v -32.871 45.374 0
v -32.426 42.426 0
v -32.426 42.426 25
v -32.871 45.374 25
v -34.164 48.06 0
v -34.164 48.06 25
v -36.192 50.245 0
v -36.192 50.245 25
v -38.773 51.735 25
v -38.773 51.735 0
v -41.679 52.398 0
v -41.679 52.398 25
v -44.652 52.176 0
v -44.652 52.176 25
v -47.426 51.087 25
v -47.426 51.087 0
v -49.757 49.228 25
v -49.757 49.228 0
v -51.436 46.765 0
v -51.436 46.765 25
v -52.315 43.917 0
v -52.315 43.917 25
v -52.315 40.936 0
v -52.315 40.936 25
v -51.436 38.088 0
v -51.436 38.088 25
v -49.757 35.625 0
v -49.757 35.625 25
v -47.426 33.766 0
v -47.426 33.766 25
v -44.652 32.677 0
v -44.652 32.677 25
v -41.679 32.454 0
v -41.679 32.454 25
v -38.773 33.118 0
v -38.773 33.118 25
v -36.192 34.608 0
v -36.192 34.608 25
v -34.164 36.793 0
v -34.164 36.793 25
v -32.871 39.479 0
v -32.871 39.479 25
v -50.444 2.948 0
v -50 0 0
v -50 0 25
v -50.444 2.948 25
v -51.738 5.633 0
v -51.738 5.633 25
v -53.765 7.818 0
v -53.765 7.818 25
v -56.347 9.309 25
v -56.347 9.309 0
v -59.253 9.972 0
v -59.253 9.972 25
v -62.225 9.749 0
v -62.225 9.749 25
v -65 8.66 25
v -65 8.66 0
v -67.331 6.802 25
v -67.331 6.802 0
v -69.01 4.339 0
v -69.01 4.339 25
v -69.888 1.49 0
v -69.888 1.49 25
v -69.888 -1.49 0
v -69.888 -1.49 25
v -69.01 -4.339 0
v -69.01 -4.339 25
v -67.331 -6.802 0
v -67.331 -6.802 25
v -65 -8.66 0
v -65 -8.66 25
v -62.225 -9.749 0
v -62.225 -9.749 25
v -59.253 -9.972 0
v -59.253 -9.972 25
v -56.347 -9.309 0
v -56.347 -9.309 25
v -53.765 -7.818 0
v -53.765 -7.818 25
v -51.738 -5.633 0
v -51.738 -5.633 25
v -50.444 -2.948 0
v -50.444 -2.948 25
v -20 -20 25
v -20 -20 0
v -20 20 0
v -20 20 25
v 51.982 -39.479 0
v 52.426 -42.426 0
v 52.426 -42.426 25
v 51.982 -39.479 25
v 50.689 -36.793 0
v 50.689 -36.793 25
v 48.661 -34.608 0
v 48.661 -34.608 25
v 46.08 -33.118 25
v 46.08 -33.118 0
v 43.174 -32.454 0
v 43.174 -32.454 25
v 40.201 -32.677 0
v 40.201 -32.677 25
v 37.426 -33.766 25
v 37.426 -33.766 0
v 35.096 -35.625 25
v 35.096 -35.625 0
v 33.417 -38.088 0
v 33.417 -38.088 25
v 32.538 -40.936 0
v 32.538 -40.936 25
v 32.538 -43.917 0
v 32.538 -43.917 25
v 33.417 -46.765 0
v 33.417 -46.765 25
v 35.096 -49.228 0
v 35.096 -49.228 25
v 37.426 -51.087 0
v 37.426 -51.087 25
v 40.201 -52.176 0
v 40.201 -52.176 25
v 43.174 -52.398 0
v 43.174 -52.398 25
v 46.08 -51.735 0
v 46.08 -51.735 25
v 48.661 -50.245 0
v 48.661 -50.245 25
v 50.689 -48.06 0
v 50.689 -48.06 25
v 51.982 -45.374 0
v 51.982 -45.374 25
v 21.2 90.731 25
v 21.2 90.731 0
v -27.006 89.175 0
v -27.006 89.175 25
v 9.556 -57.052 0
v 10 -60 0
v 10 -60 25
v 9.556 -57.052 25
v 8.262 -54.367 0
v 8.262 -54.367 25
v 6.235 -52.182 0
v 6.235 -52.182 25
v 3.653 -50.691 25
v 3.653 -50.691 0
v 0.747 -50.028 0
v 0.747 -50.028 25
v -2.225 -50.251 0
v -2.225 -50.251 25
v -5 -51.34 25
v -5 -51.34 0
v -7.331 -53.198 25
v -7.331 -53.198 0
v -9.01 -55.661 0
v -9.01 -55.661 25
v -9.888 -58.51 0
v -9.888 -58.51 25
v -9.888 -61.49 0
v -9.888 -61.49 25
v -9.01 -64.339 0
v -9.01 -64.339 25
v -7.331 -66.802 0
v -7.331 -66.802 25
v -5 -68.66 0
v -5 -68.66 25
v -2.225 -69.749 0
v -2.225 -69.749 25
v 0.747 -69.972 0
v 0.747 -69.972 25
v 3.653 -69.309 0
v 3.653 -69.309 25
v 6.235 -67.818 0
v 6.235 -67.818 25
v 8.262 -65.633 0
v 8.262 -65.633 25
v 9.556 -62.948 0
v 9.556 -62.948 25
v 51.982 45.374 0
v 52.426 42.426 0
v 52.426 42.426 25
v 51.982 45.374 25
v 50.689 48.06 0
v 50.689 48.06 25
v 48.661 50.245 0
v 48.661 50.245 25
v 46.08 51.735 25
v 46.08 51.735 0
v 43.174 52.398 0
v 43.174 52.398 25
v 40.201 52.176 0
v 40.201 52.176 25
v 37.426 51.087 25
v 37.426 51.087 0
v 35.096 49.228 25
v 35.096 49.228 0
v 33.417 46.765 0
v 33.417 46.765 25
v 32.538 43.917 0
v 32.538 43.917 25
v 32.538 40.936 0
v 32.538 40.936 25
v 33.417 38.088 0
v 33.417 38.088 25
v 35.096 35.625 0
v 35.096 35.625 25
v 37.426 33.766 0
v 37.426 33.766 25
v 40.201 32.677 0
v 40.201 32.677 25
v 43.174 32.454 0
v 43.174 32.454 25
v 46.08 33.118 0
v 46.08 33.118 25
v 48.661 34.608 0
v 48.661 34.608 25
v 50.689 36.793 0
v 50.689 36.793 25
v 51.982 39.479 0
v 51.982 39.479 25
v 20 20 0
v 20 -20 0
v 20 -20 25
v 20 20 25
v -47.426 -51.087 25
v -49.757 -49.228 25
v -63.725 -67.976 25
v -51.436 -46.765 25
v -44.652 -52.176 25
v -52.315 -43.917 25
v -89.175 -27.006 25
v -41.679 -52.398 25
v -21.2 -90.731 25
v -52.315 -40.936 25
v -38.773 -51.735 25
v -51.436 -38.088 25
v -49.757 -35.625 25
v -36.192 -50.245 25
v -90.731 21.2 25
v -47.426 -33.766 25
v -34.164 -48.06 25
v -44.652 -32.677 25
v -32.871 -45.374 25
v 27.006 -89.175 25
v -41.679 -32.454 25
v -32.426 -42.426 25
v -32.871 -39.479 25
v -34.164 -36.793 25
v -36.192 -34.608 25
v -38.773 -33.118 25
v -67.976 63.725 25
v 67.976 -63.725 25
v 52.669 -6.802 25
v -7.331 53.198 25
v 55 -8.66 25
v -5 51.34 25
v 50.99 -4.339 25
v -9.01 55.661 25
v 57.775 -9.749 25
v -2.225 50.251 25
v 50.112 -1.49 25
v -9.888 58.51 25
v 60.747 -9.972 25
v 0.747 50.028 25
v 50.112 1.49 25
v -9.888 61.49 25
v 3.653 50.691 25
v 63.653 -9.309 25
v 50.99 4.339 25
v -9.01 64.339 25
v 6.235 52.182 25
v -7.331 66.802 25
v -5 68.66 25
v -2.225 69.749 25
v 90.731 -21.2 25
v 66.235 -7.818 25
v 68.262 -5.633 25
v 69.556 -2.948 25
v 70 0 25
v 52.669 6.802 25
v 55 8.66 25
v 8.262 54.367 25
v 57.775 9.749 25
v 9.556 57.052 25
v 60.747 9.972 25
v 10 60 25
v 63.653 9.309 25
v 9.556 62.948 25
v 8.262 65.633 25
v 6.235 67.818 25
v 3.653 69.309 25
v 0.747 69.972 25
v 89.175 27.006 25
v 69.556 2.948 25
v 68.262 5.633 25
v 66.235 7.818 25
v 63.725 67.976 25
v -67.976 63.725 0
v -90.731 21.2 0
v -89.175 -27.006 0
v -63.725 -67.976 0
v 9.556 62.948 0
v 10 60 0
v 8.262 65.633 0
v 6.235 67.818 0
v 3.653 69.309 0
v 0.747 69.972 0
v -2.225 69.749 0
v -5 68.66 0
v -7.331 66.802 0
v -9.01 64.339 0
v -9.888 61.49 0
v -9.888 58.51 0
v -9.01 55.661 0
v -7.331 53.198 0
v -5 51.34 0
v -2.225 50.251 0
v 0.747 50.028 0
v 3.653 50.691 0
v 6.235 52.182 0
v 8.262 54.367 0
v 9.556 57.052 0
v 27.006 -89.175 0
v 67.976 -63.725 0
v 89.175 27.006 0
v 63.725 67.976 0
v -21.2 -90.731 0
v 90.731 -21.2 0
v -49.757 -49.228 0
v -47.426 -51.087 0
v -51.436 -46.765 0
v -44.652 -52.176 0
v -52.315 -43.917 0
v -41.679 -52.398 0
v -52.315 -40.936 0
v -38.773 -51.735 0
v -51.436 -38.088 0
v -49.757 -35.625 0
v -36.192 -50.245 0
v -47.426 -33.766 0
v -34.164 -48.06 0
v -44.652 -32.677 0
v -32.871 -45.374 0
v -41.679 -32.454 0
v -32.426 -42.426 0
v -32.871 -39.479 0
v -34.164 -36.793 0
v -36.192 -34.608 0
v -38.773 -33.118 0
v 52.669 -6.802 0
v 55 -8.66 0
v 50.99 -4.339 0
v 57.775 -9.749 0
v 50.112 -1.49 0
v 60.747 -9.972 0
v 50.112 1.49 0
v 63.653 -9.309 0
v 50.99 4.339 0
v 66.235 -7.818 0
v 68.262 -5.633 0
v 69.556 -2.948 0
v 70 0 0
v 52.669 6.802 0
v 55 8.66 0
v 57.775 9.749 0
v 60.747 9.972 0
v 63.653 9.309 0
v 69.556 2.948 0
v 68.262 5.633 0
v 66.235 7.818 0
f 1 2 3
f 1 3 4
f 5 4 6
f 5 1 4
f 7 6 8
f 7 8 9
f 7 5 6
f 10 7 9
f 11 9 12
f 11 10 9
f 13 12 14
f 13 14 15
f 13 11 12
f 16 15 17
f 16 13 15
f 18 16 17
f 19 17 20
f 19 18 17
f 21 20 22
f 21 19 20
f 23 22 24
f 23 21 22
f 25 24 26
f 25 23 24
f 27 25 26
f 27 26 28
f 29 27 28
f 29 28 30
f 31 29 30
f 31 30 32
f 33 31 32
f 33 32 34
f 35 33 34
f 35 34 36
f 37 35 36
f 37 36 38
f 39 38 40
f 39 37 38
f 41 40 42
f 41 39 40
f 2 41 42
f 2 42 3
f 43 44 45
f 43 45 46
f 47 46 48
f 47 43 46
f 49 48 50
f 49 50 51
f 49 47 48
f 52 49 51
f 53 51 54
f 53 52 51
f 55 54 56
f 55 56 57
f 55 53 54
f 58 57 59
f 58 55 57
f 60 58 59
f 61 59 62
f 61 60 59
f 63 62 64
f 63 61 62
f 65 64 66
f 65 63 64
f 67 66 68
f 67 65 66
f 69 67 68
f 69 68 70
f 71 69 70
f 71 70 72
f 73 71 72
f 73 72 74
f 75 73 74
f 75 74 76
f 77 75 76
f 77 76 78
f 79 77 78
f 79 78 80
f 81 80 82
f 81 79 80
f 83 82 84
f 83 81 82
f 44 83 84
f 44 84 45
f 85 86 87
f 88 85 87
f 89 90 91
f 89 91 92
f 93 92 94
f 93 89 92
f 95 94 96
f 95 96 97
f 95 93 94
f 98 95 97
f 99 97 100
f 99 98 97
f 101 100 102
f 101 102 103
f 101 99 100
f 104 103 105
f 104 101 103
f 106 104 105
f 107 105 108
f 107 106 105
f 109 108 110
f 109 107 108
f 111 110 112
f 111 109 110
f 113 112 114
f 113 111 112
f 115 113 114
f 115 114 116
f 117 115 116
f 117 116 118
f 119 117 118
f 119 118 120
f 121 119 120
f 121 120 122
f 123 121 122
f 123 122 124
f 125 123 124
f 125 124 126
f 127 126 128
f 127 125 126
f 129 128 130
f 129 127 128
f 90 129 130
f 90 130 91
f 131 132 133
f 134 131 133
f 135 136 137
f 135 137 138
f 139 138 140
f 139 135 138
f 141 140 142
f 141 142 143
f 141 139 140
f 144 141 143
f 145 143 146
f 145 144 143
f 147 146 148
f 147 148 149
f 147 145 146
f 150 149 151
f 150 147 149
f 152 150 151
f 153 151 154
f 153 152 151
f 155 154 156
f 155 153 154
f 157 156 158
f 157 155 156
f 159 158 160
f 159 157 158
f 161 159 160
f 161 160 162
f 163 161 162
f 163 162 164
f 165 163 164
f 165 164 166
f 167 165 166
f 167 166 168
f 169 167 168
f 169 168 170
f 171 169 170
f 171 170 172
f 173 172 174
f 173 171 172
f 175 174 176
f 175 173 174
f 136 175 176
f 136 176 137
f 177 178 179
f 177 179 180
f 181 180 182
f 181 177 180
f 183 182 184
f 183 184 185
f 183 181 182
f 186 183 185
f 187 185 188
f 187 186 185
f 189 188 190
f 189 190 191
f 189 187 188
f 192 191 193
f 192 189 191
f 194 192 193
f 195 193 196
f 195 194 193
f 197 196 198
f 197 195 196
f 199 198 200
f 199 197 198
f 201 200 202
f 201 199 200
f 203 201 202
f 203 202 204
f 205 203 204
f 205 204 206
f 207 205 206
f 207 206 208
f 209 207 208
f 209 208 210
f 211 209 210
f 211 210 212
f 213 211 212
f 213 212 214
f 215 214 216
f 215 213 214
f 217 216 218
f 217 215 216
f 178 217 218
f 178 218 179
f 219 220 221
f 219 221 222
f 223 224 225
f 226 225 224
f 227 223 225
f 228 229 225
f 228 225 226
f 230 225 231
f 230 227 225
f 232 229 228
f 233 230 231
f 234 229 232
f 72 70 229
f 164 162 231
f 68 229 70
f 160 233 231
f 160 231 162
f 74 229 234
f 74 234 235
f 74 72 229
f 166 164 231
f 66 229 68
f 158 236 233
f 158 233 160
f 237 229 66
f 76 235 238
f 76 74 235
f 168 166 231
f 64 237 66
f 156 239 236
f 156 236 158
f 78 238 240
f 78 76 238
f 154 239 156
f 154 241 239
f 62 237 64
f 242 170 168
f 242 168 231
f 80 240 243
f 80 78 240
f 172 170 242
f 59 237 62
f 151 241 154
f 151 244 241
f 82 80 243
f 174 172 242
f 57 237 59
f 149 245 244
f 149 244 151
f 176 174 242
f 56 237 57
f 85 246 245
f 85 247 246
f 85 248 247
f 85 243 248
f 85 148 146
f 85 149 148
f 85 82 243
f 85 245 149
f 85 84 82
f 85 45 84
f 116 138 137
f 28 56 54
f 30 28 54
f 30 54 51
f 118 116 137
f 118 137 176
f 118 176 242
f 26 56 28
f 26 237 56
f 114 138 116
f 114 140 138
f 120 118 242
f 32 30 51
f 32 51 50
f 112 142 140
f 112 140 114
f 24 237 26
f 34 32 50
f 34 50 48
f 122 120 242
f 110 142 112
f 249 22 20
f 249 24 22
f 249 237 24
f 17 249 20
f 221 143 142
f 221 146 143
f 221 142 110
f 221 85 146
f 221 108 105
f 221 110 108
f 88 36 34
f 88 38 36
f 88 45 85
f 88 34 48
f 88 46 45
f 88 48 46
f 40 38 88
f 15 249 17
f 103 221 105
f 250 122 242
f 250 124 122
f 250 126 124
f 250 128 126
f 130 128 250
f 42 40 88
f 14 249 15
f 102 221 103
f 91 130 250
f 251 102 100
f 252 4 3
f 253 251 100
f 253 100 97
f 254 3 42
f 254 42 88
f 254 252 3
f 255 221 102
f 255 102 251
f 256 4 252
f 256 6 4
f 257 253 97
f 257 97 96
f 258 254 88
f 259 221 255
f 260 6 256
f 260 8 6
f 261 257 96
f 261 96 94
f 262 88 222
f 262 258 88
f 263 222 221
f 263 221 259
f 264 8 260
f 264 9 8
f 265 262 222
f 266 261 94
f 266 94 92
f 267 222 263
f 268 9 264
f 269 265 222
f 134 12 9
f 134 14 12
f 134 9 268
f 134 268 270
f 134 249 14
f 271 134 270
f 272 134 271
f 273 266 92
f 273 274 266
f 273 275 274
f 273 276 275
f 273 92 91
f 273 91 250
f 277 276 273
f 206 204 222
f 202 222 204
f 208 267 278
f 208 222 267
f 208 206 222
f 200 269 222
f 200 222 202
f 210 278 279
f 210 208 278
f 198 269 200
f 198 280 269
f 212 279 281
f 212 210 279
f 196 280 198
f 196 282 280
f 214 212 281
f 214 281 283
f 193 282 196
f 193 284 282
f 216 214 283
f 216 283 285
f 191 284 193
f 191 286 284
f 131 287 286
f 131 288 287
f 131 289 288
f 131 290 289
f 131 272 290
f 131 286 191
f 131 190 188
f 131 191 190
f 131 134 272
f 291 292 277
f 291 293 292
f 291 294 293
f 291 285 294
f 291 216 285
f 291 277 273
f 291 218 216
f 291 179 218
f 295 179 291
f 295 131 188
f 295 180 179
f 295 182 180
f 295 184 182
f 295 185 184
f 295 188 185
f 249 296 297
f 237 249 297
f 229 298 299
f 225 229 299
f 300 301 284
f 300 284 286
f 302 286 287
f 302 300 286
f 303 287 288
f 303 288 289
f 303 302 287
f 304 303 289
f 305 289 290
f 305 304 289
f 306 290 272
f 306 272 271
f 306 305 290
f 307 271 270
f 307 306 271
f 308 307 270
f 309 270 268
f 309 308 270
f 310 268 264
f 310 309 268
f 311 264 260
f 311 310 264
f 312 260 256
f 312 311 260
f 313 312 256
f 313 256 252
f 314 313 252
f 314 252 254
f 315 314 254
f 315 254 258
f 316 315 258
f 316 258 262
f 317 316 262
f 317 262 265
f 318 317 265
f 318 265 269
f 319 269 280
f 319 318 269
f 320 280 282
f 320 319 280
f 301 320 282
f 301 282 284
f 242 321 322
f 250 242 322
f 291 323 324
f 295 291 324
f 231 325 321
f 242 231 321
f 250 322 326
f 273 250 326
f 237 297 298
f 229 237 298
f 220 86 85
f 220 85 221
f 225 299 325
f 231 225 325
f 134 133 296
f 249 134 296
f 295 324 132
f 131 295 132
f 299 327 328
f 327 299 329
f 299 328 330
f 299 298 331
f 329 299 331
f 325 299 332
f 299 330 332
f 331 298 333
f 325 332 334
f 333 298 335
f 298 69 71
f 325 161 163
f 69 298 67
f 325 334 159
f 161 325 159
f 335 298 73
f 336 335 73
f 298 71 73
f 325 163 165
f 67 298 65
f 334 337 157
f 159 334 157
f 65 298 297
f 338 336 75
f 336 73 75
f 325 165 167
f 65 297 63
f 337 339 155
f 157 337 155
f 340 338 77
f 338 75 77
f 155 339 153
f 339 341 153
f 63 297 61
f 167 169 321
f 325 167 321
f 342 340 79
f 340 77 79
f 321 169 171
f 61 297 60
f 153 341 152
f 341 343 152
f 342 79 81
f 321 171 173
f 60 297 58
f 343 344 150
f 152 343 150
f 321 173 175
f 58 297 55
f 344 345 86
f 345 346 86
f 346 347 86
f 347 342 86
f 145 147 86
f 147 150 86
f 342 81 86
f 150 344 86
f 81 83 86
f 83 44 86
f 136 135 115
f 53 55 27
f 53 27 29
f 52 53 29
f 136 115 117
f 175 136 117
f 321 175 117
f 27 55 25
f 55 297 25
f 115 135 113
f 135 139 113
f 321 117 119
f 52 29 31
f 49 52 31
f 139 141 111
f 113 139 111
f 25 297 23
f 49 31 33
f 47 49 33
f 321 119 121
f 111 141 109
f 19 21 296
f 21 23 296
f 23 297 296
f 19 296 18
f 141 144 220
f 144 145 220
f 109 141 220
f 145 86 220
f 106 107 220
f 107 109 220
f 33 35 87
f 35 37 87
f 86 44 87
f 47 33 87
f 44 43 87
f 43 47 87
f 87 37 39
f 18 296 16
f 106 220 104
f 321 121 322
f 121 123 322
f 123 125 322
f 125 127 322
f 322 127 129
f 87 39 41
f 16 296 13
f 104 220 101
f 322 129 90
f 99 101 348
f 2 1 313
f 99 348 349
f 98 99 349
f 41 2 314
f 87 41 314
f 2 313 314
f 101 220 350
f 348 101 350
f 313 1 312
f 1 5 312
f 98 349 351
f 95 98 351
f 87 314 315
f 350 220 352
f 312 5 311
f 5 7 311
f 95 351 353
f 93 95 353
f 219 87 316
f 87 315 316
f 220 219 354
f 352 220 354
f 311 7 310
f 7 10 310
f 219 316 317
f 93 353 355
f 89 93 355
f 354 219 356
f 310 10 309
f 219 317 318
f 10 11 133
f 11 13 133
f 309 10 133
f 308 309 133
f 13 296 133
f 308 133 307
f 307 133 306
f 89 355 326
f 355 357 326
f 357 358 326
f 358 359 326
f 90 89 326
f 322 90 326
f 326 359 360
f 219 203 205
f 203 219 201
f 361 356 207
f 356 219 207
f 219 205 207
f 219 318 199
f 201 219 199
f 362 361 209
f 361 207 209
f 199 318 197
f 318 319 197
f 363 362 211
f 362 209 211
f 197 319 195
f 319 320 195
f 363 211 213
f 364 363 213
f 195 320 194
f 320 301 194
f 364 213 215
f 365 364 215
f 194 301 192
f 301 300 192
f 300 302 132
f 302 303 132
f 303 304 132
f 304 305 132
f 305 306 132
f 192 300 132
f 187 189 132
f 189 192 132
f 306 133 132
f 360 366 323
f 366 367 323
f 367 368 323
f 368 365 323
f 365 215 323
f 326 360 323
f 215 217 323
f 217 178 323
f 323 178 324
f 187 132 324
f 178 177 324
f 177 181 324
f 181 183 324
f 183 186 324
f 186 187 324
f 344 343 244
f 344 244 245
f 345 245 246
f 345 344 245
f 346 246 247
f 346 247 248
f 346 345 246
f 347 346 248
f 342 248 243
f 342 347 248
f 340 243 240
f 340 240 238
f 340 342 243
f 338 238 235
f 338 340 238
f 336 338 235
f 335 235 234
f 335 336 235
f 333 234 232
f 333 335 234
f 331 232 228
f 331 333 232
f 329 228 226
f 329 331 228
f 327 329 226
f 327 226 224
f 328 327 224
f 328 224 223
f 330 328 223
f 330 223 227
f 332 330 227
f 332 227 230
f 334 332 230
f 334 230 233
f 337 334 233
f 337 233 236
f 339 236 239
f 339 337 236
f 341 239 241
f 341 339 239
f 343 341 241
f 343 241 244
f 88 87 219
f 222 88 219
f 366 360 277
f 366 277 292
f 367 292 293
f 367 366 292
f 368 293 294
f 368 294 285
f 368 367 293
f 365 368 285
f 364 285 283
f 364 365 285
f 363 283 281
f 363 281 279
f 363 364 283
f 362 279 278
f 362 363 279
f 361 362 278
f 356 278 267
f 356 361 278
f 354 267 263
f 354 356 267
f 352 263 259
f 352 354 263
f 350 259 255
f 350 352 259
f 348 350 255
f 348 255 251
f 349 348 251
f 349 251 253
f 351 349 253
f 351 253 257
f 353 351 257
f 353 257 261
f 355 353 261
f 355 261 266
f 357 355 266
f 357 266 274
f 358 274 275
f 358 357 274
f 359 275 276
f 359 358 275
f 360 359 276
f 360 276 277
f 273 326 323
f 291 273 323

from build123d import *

# Parameters (mm, degrees)
SKETCH3_R           = 10
SKETCH3_W           = 40
SKETCH3_H           = 40
BOSS_EXTRUDE1_DEPTH = 25


with BuildPart() as part:
    # Sketch3 → Boss-Extrude1 (new body)
    with BuildSketch(Plane.XY):
        Polygon((21.199617339, 90.731086511), (-27.006136089, 89.175234501), (-67.975617162, 63.724950422), (-90.731086511, 21.199617339), (-89.175234501, -27.006136089), (-63.724950422, -67.975617162), (-21.199617339, -90.731086511), (27.006136089, -89.175234501), (67.975617162, -63.724950422), (90.731086511, -21.199617339), (89.175234501, 27.006136089), (63.724950422, 67.975617162), align=None)
        with Locations((0, 60)):
            Circle(SKETCH3_R, mode=Mode.SUBTRACT)
        with Locations((42.426406871, 42.426406871)):
            Circle(SKETCH3_R, mode=Mode.SUBTRACT)
        with Locations((60, 0)):
            Circle(SKETCH3_R, mode=Mode.SUBTRACT)
        with Locations((42.426406871, -42.426406871)):
            Circle(SKETCH3_R, mode=Mode.SUBTRACT)
        with Locations((0, -60)):
            Circle(SKETCH3_R, mode=Mode.SUBTRACT)
        with Locations((-42.426406871, -42.426406871)):
            Circle(SKETCH3_R, mode=Mode.SUBTRACT)
        with Locations((-60, 0)):
            Circle(SKETCH3_R, mode=Mode.SUBTRACT)
        with Locations((-42.426406871, 42.426406871)):
            Circle(SKETCH3_R, mode=Mode.SUBTRACT)
        Rectangle(SKETCH3_W, SKETCH3_H, mode=Mode.SUBTRACT)
    extrude(amount=BOSS_EXTRUDE1_DEPTH)


solid = part.part
